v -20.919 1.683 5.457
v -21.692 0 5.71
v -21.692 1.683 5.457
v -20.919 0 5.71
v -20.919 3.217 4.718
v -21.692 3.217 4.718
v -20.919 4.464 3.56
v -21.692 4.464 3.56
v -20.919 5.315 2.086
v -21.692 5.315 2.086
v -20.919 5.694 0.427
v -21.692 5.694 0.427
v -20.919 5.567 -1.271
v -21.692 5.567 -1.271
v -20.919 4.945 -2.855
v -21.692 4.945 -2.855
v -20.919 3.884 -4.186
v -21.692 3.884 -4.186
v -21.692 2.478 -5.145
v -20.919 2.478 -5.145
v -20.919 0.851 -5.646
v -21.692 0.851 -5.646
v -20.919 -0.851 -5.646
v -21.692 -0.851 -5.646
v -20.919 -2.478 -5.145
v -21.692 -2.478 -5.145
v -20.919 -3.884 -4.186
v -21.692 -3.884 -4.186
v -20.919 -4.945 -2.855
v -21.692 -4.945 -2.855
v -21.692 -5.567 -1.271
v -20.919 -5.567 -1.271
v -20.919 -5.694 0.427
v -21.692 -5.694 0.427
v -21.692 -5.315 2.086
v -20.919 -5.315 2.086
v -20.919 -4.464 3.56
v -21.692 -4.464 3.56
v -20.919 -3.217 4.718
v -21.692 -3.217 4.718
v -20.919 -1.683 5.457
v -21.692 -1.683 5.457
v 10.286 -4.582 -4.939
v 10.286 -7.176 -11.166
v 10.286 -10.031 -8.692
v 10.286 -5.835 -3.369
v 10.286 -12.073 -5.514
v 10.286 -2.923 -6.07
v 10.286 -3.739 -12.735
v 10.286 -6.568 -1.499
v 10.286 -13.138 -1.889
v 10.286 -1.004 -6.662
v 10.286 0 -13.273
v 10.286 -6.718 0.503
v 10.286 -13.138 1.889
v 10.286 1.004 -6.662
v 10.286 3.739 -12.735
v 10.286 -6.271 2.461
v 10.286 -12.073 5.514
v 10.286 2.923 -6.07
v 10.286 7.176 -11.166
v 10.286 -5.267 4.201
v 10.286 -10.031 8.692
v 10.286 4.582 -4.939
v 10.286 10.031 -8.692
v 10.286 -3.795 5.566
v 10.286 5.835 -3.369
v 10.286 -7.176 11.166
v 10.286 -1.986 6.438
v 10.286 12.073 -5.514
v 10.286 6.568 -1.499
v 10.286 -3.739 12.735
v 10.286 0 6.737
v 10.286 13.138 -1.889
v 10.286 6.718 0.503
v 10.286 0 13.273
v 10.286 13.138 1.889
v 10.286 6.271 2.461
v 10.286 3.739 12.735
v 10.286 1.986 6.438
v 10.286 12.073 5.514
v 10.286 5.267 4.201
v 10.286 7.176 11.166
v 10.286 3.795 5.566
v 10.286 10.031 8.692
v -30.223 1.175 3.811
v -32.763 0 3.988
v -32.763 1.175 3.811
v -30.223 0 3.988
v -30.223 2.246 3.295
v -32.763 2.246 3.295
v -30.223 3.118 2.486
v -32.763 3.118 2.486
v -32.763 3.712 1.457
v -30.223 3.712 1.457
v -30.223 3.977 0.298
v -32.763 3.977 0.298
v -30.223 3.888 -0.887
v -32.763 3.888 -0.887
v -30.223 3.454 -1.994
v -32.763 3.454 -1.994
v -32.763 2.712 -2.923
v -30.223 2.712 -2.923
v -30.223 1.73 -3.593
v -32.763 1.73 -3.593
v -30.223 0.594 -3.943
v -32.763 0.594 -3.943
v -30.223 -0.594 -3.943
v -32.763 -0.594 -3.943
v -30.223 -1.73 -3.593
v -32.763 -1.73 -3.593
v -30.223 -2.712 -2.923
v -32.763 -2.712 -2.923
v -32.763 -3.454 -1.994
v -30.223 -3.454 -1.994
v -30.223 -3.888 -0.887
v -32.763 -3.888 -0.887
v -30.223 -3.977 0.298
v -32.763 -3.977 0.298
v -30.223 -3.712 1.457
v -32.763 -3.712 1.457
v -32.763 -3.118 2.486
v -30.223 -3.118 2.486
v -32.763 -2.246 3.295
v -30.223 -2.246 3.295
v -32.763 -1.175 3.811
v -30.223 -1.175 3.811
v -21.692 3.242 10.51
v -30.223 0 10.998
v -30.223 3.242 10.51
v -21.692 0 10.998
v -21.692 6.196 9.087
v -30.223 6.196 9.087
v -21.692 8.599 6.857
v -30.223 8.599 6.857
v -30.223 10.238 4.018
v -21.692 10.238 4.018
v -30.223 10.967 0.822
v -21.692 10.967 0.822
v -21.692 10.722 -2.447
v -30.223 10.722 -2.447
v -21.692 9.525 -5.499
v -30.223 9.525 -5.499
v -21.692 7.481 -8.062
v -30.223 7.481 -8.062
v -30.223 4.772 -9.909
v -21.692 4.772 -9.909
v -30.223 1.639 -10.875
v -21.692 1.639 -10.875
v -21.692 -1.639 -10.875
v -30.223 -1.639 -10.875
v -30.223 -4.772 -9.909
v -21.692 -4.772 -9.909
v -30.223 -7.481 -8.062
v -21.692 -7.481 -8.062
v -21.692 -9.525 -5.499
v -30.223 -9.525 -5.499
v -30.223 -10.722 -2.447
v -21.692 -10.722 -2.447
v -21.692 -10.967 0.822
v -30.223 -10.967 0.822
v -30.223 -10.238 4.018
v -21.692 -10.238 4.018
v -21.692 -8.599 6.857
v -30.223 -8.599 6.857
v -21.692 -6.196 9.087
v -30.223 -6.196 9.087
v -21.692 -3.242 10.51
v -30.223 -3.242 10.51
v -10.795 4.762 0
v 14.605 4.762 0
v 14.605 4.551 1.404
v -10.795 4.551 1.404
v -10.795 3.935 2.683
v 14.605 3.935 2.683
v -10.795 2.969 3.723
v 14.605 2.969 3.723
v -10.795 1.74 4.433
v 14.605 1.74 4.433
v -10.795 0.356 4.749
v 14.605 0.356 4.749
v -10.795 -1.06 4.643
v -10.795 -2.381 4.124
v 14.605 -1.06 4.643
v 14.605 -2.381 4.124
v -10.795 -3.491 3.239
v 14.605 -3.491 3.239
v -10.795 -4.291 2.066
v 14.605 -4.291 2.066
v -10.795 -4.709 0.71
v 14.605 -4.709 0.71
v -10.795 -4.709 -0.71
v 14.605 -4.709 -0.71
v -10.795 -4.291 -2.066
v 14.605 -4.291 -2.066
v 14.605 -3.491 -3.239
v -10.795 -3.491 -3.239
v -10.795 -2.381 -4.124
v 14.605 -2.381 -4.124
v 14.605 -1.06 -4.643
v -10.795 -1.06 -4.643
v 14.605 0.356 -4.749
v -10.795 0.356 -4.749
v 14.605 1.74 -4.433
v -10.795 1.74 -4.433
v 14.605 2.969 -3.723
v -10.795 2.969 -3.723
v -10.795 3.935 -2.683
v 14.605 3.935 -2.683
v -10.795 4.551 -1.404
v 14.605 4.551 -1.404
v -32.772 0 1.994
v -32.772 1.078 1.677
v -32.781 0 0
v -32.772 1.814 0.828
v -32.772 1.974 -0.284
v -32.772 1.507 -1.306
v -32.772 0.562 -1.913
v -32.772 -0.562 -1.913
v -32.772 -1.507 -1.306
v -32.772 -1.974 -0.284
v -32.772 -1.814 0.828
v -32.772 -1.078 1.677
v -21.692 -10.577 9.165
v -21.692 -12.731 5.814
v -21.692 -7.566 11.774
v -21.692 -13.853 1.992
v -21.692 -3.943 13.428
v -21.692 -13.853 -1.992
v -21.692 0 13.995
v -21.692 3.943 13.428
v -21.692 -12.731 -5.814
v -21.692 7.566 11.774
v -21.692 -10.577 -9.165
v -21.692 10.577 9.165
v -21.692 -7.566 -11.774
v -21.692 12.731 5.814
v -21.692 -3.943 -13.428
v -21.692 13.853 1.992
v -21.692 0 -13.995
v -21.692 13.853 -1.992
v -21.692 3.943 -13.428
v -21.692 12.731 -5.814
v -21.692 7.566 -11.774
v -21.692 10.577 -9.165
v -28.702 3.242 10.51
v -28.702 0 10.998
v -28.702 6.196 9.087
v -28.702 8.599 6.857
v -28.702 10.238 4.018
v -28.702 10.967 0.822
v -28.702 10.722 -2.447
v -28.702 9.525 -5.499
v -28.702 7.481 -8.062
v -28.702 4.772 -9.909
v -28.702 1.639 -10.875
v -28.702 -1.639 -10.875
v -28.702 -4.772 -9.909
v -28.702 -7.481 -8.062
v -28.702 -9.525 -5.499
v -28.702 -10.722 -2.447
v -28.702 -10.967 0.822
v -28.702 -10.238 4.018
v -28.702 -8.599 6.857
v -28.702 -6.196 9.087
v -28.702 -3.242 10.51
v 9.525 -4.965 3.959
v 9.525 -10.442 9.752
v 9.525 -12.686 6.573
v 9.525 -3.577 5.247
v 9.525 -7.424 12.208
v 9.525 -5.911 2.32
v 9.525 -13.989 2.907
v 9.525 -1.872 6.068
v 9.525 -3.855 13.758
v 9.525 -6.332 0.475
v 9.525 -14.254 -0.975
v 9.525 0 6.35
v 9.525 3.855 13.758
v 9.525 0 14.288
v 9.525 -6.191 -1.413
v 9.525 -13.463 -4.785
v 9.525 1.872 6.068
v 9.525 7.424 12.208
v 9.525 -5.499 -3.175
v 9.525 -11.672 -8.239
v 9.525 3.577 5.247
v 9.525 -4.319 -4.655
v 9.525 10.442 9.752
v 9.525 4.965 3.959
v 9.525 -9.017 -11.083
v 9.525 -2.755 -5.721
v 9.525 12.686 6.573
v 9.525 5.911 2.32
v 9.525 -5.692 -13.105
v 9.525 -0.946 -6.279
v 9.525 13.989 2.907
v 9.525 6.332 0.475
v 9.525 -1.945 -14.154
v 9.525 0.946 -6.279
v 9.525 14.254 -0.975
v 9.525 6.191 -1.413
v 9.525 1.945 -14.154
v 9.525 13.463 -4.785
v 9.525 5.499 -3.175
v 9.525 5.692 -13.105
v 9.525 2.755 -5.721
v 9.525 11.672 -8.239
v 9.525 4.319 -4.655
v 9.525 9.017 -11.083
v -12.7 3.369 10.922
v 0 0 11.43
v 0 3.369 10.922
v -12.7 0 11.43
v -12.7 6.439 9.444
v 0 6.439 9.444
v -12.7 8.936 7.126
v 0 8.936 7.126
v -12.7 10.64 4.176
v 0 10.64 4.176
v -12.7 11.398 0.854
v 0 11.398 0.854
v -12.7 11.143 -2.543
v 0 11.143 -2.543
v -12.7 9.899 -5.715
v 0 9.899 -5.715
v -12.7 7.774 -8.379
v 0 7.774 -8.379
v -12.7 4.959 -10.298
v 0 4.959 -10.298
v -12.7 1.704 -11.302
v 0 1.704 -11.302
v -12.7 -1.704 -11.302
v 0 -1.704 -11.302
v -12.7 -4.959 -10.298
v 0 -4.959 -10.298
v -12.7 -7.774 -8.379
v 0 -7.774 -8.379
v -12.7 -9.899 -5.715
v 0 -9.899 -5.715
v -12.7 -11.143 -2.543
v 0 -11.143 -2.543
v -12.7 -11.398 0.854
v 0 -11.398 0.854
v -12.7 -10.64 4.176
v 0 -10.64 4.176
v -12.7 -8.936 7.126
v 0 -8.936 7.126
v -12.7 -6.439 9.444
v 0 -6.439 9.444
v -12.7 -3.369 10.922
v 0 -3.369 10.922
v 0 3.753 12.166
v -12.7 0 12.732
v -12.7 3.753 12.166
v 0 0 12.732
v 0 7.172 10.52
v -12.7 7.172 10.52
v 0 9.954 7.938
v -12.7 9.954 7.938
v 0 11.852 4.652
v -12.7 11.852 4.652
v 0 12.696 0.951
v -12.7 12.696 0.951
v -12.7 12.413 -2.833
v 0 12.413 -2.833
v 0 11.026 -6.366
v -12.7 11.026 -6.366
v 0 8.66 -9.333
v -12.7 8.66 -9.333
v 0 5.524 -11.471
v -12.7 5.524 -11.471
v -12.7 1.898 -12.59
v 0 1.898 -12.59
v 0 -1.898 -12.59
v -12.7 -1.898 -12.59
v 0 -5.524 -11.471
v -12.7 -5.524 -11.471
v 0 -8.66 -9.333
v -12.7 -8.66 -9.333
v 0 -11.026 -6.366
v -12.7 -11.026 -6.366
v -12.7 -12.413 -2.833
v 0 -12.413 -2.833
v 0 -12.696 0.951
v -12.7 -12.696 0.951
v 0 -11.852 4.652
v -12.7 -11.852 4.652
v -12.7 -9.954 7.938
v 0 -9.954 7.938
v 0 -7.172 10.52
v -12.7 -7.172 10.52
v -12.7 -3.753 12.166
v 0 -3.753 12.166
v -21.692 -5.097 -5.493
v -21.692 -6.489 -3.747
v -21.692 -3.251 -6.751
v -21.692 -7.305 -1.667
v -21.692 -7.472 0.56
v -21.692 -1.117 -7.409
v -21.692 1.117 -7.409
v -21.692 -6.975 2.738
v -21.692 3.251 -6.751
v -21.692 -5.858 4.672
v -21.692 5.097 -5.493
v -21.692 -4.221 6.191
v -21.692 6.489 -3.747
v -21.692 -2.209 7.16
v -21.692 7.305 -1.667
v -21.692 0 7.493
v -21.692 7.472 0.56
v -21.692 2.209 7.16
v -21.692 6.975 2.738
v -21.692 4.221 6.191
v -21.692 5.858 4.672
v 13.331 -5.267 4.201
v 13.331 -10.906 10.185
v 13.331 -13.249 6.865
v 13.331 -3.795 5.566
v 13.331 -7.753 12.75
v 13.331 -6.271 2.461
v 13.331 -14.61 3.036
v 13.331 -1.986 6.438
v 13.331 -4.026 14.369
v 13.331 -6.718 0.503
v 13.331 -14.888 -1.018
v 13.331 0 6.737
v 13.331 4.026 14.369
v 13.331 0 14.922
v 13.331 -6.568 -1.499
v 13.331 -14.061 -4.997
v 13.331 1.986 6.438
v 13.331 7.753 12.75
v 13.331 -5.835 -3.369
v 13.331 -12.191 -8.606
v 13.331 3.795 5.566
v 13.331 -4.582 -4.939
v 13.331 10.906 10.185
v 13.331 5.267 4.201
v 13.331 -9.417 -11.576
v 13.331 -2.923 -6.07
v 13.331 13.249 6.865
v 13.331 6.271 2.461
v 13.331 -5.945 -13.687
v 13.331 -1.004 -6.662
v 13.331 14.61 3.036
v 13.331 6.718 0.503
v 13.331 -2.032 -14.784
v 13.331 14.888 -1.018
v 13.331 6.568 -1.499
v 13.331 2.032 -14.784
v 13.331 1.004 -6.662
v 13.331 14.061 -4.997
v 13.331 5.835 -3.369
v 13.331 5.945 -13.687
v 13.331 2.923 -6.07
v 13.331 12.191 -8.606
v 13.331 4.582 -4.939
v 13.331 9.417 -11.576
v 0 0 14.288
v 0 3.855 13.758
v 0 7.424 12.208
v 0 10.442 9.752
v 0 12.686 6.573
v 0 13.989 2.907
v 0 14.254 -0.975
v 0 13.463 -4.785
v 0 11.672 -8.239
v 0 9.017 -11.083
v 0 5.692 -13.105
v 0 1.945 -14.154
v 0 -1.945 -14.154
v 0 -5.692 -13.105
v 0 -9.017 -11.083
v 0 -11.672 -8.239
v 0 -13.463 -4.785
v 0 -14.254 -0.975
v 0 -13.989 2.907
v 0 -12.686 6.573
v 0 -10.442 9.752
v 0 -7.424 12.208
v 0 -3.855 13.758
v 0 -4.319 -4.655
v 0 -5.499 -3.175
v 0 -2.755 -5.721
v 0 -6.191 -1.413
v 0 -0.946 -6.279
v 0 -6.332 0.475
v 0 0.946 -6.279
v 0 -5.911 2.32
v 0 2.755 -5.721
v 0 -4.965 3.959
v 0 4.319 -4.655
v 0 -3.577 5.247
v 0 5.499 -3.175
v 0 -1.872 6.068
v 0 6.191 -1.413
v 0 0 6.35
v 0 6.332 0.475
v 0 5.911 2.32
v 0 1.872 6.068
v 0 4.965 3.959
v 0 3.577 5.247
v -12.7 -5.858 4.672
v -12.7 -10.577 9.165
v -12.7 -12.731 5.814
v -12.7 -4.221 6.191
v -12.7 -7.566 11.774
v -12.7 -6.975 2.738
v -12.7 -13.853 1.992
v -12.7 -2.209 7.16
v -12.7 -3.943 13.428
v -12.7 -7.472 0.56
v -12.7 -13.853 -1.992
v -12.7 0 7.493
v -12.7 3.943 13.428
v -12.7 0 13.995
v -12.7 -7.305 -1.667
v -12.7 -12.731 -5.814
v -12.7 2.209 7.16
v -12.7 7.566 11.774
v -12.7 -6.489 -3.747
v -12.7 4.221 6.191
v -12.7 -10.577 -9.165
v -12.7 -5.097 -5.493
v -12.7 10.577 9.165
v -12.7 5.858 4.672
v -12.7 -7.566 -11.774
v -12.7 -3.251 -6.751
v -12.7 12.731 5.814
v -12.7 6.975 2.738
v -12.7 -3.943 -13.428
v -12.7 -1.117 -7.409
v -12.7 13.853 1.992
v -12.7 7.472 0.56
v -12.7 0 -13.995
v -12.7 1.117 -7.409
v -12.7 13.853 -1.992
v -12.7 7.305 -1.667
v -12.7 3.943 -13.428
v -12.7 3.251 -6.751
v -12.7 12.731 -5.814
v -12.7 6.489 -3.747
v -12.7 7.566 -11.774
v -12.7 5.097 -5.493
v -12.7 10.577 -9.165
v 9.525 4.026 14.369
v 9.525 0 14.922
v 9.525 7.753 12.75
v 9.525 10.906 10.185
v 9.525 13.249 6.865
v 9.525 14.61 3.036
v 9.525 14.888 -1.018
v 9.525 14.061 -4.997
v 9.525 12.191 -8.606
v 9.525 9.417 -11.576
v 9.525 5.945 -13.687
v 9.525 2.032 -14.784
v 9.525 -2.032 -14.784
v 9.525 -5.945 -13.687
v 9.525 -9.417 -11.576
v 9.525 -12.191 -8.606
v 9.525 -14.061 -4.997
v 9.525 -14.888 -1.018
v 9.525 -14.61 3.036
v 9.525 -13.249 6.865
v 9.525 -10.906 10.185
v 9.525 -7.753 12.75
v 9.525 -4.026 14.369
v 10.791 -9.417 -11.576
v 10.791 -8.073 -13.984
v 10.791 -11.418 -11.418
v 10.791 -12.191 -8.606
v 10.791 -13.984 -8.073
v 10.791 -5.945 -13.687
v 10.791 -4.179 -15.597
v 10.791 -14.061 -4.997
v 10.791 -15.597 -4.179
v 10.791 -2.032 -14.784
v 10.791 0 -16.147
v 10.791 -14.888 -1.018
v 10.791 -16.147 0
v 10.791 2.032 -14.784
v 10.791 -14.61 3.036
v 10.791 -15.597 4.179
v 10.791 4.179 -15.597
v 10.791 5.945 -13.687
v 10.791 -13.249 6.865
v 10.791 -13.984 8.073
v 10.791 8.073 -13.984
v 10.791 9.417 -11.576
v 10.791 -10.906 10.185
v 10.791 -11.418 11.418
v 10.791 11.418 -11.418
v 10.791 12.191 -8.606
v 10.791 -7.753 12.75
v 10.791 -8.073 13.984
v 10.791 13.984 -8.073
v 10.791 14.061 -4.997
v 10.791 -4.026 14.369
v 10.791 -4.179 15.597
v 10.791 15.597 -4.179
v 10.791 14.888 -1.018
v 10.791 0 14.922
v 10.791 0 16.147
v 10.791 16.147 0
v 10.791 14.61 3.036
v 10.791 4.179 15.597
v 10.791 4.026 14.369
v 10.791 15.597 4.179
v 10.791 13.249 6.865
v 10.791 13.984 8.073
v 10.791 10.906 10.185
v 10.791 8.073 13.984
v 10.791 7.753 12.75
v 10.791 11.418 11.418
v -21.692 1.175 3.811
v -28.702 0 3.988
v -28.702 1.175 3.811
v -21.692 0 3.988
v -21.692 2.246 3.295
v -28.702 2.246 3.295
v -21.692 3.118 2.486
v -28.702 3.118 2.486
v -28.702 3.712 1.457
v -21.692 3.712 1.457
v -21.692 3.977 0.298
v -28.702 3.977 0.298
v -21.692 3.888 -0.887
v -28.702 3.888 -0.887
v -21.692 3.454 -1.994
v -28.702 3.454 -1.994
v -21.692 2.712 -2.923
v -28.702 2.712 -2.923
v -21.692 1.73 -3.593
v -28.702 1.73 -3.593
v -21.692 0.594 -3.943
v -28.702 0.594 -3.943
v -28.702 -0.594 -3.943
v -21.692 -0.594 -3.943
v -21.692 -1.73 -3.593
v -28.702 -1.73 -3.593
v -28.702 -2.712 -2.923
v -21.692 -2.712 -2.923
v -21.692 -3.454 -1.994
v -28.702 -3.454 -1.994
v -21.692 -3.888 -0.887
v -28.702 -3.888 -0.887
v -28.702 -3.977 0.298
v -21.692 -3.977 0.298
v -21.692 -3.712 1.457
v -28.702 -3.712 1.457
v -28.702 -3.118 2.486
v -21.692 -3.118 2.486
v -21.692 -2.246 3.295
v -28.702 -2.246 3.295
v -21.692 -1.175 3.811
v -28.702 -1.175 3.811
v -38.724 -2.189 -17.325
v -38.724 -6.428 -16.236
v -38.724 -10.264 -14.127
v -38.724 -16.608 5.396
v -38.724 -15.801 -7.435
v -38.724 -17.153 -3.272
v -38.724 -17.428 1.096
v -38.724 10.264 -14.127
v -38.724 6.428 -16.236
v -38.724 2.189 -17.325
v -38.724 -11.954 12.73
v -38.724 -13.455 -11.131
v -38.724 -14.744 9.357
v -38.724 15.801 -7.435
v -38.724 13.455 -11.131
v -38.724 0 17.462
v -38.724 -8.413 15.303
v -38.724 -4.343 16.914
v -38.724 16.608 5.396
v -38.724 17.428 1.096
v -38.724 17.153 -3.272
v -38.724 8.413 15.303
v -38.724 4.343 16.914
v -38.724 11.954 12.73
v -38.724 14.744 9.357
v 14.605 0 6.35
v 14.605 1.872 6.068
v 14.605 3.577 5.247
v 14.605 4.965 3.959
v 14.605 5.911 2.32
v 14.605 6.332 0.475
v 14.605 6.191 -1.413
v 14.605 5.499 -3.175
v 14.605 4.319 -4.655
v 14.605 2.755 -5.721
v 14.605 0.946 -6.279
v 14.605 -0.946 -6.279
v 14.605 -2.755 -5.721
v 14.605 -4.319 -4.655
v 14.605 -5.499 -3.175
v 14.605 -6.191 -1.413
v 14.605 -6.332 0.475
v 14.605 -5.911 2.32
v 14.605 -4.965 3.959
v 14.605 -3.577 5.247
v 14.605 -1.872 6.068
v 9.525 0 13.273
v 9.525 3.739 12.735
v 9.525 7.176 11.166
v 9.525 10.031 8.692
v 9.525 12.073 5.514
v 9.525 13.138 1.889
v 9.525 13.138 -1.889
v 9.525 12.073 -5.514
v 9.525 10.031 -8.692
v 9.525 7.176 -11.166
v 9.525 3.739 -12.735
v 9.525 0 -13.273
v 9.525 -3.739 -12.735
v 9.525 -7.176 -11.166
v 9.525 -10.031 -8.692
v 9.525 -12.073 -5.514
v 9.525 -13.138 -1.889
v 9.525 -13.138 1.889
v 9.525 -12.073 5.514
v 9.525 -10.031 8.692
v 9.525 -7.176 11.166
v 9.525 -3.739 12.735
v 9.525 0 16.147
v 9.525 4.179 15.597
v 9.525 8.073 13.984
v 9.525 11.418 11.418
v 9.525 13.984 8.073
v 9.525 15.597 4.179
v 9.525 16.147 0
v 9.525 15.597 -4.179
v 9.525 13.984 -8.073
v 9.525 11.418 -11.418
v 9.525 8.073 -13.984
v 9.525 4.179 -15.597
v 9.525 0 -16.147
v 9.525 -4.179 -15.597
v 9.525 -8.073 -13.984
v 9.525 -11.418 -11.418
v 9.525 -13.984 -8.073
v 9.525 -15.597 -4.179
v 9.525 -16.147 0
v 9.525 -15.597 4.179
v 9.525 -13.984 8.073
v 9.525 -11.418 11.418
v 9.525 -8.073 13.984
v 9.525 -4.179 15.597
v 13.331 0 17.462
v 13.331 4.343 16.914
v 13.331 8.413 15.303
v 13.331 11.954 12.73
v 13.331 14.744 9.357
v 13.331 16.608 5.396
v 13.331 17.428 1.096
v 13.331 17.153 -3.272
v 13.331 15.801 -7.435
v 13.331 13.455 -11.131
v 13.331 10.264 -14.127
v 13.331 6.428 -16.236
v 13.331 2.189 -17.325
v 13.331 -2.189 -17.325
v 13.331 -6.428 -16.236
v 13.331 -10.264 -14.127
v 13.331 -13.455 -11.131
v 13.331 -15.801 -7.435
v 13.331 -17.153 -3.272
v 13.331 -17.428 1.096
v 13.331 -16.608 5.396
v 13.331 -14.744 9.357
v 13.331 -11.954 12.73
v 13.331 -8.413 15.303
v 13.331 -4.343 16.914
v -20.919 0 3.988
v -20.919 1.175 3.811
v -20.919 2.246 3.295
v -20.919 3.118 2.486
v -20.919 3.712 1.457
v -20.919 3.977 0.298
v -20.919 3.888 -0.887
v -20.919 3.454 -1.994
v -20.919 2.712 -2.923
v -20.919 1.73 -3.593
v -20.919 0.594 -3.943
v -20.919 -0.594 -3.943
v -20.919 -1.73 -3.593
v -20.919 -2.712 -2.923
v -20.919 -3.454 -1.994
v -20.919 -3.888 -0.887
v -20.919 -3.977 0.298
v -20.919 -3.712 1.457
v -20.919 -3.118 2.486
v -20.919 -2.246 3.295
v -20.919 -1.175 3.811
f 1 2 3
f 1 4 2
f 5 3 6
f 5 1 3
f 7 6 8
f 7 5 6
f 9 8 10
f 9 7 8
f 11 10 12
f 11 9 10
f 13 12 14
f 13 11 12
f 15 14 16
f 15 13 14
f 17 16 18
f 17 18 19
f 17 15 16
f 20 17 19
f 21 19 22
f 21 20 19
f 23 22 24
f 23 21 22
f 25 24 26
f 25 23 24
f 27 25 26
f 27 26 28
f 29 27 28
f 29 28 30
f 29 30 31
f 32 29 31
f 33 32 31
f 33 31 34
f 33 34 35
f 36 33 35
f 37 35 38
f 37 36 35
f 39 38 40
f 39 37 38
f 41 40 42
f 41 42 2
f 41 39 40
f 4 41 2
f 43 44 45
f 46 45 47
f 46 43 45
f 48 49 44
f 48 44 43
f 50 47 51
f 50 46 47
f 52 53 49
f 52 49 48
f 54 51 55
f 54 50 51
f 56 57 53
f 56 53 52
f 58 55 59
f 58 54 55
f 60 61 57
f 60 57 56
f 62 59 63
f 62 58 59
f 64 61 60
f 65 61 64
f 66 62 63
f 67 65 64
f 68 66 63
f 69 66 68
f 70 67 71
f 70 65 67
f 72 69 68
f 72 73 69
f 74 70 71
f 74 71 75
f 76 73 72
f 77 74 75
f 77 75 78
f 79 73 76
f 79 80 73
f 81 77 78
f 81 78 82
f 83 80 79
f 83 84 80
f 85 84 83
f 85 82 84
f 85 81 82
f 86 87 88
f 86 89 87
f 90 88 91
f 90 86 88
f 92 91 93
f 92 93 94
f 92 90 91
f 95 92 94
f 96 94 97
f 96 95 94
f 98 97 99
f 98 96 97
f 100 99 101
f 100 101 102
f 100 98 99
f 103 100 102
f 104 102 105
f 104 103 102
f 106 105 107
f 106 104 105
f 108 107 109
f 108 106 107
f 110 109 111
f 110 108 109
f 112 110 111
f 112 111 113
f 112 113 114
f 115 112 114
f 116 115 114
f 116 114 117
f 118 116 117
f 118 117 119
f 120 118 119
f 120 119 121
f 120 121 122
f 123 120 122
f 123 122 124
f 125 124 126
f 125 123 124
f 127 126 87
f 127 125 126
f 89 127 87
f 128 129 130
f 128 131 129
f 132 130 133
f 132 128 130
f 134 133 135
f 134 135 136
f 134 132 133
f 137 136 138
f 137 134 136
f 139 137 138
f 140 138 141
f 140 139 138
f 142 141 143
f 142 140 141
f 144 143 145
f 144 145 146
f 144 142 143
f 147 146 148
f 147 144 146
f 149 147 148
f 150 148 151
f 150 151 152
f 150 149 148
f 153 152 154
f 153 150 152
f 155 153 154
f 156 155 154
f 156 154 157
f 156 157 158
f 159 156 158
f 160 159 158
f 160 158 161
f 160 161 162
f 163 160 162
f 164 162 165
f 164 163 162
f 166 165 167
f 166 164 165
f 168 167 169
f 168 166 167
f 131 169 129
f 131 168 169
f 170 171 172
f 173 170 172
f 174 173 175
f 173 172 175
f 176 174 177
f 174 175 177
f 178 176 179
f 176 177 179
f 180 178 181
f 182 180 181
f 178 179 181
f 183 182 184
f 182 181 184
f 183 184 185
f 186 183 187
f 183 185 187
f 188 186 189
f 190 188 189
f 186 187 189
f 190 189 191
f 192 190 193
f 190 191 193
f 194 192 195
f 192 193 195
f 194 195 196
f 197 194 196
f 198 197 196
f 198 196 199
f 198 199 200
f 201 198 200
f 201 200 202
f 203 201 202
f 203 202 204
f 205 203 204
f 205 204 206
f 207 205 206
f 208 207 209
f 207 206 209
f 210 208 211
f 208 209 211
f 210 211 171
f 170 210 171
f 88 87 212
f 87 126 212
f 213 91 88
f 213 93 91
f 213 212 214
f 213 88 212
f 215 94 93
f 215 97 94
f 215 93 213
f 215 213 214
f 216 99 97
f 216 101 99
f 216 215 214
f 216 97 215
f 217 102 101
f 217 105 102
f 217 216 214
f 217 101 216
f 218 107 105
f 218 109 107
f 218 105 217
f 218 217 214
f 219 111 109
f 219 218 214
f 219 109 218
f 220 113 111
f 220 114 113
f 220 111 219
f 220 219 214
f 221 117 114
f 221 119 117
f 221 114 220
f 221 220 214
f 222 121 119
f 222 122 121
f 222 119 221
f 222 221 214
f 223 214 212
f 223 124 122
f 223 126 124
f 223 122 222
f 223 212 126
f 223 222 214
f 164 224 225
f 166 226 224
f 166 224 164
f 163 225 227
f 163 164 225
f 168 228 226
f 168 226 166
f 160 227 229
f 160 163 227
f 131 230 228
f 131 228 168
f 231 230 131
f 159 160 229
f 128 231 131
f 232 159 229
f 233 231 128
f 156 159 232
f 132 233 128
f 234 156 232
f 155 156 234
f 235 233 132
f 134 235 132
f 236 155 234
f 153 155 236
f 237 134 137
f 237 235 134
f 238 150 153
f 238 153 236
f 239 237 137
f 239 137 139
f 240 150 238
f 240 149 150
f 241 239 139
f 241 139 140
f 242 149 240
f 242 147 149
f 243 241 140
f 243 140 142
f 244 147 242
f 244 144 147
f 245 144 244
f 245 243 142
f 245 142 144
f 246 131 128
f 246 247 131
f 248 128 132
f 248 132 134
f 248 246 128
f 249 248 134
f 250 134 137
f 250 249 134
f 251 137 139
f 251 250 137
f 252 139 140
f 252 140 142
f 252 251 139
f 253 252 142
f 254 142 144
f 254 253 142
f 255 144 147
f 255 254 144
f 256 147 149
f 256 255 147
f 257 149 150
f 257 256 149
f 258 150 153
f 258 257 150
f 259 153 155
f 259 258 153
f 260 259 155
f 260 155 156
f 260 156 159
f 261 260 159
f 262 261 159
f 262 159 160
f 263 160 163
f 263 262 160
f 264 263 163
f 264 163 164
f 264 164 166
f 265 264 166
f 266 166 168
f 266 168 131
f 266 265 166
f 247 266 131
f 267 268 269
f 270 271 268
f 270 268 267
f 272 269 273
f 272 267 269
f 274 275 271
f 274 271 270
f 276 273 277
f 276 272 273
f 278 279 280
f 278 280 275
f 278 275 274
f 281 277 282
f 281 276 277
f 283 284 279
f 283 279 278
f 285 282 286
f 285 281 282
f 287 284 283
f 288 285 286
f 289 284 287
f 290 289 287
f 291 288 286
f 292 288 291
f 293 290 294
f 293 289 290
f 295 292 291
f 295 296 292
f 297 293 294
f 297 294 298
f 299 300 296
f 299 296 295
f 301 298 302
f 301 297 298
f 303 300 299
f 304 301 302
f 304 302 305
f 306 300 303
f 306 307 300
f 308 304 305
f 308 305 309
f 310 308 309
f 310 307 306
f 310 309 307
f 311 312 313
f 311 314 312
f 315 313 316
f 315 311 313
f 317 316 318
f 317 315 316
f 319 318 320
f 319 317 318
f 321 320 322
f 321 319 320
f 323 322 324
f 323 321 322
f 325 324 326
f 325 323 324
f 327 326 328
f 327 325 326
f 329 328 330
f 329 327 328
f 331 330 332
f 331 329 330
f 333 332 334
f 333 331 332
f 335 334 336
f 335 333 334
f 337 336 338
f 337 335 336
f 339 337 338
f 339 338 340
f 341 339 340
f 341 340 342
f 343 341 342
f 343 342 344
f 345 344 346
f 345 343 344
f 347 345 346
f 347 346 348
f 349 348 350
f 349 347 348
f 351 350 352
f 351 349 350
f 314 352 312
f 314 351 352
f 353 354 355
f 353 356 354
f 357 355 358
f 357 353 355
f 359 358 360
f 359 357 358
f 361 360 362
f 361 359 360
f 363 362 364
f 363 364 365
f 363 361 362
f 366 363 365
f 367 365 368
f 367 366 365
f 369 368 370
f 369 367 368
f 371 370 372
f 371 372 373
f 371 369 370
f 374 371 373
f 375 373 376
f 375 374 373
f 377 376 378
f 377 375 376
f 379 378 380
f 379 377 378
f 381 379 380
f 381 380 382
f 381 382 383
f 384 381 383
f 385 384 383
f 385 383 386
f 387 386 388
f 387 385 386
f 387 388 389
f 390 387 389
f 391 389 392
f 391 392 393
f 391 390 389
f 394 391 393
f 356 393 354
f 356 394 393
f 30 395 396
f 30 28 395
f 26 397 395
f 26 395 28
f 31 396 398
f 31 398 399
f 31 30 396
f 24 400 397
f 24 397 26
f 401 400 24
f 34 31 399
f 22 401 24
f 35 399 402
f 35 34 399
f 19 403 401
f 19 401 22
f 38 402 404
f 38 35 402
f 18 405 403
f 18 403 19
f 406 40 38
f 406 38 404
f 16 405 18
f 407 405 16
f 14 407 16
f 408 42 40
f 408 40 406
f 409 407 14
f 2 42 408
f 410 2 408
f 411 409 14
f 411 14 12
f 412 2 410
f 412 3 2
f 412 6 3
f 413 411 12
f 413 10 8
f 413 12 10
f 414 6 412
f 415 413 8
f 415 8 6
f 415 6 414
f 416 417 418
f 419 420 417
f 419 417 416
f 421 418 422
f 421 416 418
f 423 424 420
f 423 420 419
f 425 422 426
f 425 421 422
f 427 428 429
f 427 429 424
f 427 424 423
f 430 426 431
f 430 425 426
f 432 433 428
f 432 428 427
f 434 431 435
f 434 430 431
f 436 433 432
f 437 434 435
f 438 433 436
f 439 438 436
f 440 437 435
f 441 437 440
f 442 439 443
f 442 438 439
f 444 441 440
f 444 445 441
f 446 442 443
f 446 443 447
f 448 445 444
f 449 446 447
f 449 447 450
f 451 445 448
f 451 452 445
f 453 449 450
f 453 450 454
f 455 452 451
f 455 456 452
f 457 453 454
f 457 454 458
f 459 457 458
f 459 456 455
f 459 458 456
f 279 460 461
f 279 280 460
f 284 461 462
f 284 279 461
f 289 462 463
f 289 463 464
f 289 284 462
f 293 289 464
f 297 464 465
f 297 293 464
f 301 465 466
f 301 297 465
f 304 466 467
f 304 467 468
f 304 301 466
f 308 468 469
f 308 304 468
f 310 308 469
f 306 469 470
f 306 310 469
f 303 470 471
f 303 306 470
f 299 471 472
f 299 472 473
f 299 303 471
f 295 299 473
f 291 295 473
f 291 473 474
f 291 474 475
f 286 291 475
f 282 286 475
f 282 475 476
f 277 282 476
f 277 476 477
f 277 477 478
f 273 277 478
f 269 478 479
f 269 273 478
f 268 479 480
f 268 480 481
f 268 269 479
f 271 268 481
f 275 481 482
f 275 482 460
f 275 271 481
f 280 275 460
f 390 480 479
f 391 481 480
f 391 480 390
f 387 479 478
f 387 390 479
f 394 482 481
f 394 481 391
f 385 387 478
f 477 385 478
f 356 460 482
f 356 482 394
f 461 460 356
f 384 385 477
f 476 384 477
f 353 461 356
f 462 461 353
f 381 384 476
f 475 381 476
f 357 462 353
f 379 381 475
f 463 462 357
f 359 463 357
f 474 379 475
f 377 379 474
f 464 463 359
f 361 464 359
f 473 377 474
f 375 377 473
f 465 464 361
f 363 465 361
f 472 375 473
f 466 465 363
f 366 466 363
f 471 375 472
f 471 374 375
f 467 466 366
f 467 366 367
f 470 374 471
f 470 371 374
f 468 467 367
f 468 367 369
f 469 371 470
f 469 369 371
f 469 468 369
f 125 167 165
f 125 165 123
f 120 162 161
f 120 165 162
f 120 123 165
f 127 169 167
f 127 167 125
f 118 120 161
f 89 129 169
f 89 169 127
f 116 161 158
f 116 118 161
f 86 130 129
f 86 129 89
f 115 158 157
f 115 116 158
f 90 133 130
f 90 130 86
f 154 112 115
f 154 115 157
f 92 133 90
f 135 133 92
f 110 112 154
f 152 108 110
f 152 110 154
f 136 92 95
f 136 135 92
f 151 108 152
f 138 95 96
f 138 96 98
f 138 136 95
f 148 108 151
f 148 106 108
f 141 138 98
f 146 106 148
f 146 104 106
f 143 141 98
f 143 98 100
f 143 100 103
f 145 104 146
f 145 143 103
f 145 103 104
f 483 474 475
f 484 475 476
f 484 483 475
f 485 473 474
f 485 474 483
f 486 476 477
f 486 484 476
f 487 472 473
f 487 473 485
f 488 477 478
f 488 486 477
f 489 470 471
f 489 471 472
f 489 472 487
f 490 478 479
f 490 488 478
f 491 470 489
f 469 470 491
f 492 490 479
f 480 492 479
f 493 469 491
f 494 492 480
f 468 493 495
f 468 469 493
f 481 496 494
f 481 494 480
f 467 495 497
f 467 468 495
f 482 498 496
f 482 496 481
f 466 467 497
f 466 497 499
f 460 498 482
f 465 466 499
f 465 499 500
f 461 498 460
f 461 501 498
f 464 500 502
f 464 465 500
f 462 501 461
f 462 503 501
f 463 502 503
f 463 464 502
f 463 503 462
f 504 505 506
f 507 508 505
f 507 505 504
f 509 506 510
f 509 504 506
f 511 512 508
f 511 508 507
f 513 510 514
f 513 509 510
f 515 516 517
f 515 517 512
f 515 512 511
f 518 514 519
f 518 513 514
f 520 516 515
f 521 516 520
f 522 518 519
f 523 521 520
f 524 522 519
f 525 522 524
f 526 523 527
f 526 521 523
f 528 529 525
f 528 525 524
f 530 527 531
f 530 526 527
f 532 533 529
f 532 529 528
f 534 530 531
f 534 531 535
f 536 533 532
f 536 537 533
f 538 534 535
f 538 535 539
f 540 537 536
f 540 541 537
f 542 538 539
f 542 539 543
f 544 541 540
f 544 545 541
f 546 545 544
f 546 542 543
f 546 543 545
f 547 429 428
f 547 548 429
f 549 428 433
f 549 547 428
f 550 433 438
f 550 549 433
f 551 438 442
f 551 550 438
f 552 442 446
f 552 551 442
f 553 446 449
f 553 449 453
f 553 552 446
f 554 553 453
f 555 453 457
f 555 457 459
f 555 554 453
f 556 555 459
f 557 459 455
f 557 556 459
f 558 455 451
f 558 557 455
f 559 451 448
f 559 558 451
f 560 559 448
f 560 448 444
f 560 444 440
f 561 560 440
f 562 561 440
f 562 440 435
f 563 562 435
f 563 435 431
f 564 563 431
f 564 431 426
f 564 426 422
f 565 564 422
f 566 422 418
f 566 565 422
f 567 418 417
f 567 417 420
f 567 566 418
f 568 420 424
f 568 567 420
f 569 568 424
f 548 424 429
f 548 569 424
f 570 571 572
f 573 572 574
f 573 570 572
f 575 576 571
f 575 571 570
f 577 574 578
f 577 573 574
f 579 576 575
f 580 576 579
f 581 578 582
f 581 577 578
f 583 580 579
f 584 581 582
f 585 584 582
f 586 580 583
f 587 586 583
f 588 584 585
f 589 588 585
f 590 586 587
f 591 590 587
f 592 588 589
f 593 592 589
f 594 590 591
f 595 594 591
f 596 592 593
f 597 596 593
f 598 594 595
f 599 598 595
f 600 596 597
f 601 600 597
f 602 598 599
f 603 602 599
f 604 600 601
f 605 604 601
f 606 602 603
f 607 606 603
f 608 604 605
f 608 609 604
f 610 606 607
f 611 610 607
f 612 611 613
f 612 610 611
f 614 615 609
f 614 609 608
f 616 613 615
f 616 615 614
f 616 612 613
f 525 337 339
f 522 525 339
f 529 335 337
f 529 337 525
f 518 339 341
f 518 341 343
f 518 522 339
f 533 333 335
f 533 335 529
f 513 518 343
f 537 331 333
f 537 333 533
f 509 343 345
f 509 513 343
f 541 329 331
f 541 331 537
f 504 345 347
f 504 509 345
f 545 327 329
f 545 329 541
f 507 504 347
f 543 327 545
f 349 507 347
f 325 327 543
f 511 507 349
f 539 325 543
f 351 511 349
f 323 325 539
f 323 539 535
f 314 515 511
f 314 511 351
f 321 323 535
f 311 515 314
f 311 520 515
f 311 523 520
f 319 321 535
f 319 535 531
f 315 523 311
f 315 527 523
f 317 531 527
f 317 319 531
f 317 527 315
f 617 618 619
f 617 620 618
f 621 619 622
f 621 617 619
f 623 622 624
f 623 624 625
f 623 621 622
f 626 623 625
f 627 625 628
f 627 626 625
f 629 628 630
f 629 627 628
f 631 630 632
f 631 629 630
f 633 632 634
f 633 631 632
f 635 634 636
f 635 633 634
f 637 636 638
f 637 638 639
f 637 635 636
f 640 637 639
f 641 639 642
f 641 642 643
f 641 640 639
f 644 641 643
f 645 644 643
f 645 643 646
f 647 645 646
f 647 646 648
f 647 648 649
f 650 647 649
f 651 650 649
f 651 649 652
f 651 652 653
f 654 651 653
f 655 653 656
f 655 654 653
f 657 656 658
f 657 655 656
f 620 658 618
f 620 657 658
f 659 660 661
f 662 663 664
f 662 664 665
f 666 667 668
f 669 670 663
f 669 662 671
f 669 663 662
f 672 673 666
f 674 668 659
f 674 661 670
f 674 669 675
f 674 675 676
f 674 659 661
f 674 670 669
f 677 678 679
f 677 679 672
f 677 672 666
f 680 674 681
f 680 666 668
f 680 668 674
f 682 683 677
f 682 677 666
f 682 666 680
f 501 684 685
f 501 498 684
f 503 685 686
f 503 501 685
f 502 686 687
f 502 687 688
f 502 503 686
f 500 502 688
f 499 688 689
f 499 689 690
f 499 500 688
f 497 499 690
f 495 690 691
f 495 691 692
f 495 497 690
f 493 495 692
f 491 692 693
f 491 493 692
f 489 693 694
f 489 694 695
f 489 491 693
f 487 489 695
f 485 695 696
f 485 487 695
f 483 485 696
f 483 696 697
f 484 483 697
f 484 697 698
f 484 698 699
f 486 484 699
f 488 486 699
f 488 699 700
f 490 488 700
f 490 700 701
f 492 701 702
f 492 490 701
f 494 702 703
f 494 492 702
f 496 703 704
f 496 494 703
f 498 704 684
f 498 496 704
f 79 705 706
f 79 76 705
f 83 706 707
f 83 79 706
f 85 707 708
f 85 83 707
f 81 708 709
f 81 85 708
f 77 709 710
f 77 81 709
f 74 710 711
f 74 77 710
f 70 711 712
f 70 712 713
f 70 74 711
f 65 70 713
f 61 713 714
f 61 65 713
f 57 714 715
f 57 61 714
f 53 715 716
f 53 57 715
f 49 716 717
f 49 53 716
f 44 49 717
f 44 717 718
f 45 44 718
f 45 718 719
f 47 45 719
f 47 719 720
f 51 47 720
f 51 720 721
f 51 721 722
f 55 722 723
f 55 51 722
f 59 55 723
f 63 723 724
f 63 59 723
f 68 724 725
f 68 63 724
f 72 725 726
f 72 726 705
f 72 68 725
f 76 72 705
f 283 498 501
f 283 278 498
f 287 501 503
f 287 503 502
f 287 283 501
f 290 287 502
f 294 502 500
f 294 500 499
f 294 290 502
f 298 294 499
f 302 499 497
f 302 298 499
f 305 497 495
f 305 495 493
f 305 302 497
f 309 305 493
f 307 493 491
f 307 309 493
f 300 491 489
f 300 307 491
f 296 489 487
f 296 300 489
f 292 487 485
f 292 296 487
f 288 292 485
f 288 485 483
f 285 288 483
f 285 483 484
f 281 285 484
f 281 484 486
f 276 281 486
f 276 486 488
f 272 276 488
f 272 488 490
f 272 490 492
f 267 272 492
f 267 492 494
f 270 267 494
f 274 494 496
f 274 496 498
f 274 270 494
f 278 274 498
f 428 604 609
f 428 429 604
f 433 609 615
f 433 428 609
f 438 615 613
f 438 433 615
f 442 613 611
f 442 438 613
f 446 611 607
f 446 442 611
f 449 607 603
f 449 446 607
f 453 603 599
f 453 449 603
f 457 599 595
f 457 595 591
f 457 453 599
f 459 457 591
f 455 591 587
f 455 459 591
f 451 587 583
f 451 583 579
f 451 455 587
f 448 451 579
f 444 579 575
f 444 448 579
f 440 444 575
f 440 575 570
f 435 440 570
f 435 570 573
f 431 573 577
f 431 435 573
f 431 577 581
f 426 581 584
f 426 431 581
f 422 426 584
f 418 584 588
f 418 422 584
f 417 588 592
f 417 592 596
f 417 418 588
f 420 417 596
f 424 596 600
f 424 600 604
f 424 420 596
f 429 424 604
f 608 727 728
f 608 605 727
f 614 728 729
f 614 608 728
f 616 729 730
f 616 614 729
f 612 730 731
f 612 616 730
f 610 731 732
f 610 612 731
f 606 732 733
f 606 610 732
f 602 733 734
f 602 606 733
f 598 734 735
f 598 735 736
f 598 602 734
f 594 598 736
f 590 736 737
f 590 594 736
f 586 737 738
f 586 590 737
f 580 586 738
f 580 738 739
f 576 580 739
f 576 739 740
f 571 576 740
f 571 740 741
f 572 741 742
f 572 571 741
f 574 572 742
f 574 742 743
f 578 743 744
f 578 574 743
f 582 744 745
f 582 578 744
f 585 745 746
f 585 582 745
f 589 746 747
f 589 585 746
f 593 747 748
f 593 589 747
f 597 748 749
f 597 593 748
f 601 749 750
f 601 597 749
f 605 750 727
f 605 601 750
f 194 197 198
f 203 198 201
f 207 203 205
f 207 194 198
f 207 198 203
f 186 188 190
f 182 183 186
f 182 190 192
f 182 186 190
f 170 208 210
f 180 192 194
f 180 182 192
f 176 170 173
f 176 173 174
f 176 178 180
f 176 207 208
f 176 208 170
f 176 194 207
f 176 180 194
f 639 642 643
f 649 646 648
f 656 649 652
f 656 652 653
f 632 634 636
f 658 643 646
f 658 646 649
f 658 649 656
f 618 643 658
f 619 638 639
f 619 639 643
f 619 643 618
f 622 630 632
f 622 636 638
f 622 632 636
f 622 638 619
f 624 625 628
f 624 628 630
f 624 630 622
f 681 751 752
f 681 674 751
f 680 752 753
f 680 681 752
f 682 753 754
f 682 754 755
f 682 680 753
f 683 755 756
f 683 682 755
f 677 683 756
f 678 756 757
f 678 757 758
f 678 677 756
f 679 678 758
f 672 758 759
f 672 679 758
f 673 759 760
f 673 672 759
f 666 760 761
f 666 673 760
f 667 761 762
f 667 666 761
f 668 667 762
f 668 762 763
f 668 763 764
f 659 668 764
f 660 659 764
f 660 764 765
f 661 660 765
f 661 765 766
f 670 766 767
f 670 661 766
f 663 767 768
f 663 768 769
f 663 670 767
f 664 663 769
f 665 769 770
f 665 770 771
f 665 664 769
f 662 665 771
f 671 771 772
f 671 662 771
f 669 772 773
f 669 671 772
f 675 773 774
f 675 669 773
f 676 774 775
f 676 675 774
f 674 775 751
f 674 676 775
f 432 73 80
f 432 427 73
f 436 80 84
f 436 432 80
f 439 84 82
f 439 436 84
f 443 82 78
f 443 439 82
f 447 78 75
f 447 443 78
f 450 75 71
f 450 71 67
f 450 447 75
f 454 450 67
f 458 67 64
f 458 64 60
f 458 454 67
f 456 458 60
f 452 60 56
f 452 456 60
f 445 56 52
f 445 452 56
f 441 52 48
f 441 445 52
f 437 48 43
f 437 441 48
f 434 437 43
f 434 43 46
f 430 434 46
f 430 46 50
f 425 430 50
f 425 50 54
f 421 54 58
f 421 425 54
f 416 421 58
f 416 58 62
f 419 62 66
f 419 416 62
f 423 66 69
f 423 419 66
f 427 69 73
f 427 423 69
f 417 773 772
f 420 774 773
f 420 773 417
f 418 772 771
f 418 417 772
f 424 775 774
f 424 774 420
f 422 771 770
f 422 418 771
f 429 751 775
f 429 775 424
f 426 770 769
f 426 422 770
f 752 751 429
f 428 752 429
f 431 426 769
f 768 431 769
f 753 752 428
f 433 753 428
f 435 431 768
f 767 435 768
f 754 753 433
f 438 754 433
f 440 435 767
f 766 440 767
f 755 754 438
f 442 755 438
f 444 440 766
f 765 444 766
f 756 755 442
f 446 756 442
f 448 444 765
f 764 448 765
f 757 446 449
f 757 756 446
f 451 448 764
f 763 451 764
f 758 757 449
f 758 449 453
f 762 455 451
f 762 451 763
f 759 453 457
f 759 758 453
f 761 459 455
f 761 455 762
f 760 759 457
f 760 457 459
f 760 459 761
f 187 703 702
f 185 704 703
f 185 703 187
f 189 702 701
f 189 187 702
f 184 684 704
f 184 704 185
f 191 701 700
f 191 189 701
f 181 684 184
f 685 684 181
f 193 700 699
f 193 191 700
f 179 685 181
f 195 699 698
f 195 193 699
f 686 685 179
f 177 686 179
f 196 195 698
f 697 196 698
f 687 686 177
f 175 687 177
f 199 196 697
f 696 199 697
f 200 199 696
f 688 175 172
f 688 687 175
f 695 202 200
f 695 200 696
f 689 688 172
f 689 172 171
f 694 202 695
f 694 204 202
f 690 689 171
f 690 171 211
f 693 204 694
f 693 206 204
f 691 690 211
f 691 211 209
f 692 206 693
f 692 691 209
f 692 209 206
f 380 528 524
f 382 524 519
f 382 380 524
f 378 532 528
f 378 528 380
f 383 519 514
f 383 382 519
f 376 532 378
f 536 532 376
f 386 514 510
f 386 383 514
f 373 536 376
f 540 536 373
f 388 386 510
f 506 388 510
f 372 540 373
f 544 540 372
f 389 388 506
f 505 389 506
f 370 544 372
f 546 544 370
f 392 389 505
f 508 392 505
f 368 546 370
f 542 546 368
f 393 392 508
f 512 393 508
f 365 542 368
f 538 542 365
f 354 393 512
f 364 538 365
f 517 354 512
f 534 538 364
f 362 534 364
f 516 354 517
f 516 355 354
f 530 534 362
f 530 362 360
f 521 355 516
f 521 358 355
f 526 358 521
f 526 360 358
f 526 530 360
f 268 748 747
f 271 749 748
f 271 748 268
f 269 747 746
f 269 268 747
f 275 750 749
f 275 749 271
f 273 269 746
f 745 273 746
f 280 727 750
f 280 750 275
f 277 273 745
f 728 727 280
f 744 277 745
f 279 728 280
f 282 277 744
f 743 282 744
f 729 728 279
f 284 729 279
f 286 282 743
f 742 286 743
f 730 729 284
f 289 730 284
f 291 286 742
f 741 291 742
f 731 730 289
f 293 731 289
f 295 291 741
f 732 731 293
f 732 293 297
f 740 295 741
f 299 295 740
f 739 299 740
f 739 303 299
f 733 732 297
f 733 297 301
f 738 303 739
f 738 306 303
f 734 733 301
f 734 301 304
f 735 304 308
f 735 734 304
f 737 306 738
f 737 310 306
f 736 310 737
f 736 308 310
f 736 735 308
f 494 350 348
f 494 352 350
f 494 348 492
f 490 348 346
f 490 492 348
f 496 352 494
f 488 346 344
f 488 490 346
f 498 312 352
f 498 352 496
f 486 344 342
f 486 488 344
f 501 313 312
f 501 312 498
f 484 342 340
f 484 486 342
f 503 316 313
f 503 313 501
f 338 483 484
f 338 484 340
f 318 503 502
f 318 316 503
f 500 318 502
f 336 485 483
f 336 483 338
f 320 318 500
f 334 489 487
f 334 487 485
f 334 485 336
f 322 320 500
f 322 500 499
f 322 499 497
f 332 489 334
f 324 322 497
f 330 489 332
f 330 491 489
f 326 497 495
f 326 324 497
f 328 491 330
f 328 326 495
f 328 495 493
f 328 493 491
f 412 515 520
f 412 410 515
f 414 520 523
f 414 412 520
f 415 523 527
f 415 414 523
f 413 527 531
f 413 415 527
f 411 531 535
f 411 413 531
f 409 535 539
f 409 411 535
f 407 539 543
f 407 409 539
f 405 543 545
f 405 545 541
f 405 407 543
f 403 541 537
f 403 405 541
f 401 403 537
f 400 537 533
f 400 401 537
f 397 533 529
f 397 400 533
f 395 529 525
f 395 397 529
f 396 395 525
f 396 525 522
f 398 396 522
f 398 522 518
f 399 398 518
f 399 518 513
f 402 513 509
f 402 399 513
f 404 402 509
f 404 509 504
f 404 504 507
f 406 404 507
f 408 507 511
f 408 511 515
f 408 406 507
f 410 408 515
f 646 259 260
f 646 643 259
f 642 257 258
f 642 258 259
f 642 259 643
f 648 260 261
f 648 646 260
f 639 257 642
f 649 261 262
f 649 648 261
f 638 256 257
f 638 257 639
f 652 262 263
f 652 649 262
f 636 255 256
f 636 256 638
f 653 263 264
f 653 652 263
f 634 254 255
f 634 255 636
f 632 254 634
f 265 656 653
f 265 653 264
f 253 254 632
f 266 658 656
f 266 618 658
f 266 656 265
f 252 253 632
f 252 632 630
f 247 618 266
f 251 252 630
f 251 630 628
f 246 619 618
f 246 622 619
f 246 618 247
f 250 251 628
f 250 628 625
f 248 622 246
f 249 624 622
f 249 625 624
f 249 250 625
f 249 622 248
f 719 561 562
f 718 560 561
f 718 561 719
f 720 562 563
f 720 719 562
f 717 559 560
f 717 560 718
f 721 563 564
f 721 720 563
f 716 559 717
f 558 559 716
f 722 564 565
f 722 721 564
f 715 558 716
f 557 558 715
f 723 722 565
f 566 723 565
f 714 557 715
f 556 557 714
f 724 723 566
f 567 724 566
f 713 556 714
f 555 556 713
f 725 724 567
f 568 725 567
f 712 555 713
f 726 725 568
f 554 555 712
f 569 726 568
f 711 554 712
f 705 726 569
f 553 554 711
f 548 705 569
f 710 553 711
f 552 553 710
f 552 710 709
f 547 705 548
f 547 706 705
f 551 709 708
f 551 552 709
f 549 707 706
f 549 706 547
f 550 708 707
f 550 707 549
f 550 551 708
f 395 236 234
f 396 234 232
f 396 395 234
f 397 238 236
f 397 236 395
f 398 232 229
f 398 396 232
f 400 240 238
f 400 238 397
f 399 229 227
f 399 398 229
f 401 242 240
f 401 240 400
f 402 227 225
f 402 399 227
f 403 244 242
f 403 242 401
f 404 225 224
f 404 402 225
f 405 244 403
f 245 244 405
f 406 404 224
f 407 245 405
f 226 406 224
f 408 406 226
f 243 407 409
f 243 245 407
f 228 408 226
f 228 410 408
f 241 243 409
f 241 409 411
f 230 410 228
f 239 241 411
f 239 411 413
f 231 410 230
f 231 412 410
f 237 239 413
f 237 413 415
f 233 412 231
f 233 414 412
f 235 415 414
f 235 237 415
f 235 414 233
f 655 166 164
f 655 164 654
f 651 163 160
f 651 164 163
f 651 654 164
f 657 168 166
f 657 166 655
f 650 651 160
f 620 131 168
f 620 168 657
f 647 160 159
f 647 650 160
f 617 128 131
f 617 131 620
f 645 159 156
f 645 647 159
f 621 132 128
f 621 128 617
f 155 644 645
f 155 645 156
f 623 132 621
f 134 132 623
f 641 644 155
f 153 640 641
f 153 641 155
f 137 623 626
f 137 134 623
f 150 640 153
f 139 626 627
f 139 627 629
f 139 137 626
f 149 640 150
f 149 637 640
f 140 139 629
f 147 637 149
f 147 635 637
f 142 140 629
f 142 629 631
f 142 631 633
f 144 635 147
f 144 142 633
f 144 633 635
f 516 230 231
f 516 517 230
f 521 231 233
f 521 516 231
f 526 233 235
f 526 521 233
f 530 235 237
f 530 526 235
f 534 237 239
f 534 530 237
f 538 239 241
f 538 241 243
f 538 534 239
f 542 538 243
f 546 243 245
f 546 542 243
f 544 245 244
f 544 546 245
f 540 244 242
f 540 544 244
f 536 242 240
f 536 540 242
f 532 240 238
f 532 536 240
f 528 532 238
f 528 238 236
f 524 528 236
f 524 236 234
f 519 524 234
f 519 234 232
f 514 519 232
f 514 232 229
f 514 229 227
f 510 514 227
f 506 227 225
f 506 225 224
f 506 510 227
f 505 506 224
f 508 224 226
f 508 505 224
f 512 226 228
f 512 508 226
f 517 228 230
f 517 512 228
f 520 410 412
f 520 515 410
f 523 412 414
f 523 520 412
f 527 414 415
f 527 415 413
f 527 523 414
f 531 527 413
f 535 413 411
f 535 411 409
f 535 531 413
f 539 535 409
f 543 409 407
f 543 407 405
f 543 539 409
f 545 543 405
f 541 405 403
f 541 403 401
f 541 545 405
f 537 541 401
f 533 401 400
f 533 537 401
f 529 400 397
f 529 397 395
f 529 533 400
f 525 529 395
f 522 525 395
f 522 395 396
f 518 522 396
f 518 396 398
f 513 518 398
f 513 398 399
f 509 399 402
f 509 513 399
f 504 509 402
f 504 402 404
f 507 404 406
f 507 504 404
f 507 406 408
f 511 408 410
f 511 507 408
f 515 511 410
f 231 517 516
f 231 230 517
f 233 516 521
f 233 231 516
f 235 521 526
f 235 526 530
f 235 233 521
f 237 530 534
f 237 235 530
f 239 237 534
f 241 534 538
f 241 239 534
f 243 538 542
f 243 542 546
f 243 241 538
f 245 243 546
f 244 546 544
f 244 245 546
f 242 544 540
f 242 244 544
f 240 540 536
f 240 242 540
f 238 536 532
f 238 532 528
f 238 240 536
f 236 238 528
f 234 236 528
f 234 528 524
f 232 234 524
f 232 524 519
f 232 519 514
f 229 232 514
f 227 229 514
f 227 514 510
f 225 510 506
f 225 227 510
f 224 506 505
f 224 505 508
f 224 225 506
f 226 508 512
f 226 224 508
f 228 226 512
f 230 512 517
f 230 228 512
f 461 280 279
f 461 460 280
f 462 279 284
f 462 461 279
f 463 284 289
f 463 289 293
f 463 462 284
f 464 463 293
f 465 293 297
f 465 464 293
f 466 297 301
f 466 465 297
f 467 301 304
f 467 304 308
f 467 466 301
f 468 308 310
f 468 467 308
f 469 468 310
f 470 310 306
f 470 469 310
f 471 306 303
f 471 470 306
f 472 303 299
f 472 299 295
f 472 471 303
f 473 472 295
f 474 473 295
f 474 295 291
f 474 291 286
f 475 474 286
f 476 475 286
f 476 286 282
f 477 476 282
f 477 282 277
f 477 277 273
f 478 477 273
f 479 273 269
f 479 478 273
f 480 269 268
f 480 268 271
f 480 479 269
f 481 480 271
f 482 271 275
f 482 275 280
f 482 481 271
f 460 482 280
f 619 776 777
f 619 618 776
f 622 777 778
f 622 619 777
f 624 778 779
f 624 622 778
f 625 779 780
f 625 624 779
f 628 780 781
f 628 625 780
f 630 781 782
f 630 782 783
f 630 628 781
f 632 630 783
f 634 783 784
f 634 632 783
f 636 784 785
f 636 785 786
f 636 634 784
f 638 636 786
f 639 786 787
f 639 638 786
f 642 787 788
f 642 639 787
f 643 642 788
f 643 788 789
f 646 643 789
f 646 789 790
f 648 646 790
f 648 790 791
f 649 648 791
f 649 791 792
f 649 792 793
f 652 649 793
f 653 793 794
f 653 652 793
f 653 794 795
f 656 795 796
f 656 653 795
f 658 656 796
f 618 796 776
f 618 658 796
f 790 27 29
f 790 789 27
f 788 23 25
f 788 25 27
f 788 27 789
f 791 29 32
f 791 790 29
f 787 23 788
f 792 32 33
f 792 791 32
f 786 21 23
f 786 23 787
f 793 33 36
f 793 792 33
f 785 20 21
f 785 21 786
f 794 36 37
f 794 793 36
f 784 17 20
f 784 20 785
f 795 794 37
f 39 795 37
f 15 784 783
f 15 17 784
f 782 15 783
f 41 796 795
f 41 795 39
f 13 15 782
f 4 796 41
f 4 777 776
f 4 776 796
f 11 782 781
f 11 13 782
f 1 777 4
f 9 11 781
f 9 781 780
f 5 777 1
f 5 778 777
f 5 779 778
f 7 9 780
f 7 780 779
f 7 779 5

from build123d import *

# Parameters (mm, degrees)
F3_R     = 4.7625
F4_DEPTH = 25.4


# Not quite as in the source:
# - a feature names something its author has since deleted; it is built from what else it names


with BuildPart() as f1:
    # F0 (on Front) → F1 (revolve)
    with BuildSketch(Plane.XZ):
        Polygon((-12.7, 0), (0, 0), (9.525, 0), (14.605, 0), (14.605, 6.35), (9.525, 6.35), (0, 6.35), (0, 11.43), (-12.7, 11.43), (-12.7, 7.493), (-21.6916, 7.493), (-21.6916, 5.7102125138), (-20.9189541638, 5.7102125138), (-20.9189541638, 3.9878), (-21.6916, 3.9878), (-28.702, 3.9878), (-28.702, 0), (-27.686, 0), (-26.6954, 0), (-21.6916, 0), align=None)
    revolve(axis=Axis((-24.1935, 0, 0), (-1, 0, 0)))

    # F3 (on face) → F4 (cut)
    with BuildSketch(Plane.YZ.offset(14.605)):
        Circle(F3_R)
    extrude(amount=-F4_DEPTH, mode=Mode.SUBTRACT)


with BuildPart() as f2:
    # F0 (on Front) → F2 (revolve)
    with BuildSketch(Plane.XZ):
        Polygon((0, 6.35), (9.525, 6.35), (9.525, 13.2726598531), (9.525, 14.2875), (0, 14.2875), (0, 12.7320755273), (0, 11.43), align=None)
    revolve(axis=Axis((0, 0, 0), (-1, 0, 0)))


with BuildPart() as f2b:
    # F0 (on Front) → F2, piece 2 (revolve)
    with BuildSketch(Plane.XZ):
        Polygon((-12.7, 7.493), (-12.7, 11.43), (-12.7, 12.7320755273), (-12.7, 13.9954), (-21.6916, 13.9954), (-21.6916, 10.9982), (-21.6916, 7.493), align=None)
    revolve(axis=Axis((0, 0, 0), (-1, 0, 0)))


with BuildPart() as f5:
    # F0 (on Front) → F5 (revolve)
    with BuildSketch(Plane.XZ):
        Polygon((0, 14.2875), (9.525, 14.2875), (9.525, 14.9225), (9.525, 16.1469075829), (10.7906318894, 16.1469075829), (10.7906318894, 14.9225), (13.3306318894, 14.9225), (13.3306318894, 17.4625), (-37.4693681106, 17.4625), (-38.7236513197, 17.4625), (-38.7236513197, 0), (-37.4693681106, 0), (-32.7810309827, 0), (-32.7628890359, 3.9878), (-30.2228890359, 3.9878), (-30.2228890359, 10.9982), (-28.702, 10.9982), (-27.686, 10.9982), (-21.6916, 10.9982), (-21.6916, 13.9954), (-12.7, 13.9954), (-12.7, 12.7320755273), (0, 12.7320755273), align=None)
    revolve(axis=Axis((-12.7, 0, 0), (-1, 0, 0)))


with BuildPart() as f6:
    # F0 (on Front) → F6 (revolve)
    with BuildSketch(Plane.XZ):
        Polygon((9.525, 14.2875), (9.525, 13.2726598531), (10.285962373, 13.2726598531), (10.285962373, 7.4942293577), (10.285962373, 6.7371539772), (13.3306318894, 6.7371539772), (13.3306318894, 7.4942293577), (13.3306318894, 14.9225), (10.7906318894, 14.9225), (9.525, 14.9225), align=None)
    revolve(axis=Axis((14.605, 0, 0), (-1, 0, 0)))


with BuildPart() as f7:
    # F0 (on Front) → F7 (revolve)
    with BuildSketch(Plane.XZ):
        Polygon((-28.702, 10.9982), (-28.702, 3.9878), (-21.6916, 3.9878), (-21.6916, 5.7102125138), (-21.6916, 7.493), (-21.6916, 10.9982), (-27.686, 10.9982), align=None)
    revolve(axis=Axis((13.3306318894, 0, 0), (-1, 0, 0)))


solid = Compound([f1.part, f2.part, f2b.part, f5.part, f6.part, f7.part])
